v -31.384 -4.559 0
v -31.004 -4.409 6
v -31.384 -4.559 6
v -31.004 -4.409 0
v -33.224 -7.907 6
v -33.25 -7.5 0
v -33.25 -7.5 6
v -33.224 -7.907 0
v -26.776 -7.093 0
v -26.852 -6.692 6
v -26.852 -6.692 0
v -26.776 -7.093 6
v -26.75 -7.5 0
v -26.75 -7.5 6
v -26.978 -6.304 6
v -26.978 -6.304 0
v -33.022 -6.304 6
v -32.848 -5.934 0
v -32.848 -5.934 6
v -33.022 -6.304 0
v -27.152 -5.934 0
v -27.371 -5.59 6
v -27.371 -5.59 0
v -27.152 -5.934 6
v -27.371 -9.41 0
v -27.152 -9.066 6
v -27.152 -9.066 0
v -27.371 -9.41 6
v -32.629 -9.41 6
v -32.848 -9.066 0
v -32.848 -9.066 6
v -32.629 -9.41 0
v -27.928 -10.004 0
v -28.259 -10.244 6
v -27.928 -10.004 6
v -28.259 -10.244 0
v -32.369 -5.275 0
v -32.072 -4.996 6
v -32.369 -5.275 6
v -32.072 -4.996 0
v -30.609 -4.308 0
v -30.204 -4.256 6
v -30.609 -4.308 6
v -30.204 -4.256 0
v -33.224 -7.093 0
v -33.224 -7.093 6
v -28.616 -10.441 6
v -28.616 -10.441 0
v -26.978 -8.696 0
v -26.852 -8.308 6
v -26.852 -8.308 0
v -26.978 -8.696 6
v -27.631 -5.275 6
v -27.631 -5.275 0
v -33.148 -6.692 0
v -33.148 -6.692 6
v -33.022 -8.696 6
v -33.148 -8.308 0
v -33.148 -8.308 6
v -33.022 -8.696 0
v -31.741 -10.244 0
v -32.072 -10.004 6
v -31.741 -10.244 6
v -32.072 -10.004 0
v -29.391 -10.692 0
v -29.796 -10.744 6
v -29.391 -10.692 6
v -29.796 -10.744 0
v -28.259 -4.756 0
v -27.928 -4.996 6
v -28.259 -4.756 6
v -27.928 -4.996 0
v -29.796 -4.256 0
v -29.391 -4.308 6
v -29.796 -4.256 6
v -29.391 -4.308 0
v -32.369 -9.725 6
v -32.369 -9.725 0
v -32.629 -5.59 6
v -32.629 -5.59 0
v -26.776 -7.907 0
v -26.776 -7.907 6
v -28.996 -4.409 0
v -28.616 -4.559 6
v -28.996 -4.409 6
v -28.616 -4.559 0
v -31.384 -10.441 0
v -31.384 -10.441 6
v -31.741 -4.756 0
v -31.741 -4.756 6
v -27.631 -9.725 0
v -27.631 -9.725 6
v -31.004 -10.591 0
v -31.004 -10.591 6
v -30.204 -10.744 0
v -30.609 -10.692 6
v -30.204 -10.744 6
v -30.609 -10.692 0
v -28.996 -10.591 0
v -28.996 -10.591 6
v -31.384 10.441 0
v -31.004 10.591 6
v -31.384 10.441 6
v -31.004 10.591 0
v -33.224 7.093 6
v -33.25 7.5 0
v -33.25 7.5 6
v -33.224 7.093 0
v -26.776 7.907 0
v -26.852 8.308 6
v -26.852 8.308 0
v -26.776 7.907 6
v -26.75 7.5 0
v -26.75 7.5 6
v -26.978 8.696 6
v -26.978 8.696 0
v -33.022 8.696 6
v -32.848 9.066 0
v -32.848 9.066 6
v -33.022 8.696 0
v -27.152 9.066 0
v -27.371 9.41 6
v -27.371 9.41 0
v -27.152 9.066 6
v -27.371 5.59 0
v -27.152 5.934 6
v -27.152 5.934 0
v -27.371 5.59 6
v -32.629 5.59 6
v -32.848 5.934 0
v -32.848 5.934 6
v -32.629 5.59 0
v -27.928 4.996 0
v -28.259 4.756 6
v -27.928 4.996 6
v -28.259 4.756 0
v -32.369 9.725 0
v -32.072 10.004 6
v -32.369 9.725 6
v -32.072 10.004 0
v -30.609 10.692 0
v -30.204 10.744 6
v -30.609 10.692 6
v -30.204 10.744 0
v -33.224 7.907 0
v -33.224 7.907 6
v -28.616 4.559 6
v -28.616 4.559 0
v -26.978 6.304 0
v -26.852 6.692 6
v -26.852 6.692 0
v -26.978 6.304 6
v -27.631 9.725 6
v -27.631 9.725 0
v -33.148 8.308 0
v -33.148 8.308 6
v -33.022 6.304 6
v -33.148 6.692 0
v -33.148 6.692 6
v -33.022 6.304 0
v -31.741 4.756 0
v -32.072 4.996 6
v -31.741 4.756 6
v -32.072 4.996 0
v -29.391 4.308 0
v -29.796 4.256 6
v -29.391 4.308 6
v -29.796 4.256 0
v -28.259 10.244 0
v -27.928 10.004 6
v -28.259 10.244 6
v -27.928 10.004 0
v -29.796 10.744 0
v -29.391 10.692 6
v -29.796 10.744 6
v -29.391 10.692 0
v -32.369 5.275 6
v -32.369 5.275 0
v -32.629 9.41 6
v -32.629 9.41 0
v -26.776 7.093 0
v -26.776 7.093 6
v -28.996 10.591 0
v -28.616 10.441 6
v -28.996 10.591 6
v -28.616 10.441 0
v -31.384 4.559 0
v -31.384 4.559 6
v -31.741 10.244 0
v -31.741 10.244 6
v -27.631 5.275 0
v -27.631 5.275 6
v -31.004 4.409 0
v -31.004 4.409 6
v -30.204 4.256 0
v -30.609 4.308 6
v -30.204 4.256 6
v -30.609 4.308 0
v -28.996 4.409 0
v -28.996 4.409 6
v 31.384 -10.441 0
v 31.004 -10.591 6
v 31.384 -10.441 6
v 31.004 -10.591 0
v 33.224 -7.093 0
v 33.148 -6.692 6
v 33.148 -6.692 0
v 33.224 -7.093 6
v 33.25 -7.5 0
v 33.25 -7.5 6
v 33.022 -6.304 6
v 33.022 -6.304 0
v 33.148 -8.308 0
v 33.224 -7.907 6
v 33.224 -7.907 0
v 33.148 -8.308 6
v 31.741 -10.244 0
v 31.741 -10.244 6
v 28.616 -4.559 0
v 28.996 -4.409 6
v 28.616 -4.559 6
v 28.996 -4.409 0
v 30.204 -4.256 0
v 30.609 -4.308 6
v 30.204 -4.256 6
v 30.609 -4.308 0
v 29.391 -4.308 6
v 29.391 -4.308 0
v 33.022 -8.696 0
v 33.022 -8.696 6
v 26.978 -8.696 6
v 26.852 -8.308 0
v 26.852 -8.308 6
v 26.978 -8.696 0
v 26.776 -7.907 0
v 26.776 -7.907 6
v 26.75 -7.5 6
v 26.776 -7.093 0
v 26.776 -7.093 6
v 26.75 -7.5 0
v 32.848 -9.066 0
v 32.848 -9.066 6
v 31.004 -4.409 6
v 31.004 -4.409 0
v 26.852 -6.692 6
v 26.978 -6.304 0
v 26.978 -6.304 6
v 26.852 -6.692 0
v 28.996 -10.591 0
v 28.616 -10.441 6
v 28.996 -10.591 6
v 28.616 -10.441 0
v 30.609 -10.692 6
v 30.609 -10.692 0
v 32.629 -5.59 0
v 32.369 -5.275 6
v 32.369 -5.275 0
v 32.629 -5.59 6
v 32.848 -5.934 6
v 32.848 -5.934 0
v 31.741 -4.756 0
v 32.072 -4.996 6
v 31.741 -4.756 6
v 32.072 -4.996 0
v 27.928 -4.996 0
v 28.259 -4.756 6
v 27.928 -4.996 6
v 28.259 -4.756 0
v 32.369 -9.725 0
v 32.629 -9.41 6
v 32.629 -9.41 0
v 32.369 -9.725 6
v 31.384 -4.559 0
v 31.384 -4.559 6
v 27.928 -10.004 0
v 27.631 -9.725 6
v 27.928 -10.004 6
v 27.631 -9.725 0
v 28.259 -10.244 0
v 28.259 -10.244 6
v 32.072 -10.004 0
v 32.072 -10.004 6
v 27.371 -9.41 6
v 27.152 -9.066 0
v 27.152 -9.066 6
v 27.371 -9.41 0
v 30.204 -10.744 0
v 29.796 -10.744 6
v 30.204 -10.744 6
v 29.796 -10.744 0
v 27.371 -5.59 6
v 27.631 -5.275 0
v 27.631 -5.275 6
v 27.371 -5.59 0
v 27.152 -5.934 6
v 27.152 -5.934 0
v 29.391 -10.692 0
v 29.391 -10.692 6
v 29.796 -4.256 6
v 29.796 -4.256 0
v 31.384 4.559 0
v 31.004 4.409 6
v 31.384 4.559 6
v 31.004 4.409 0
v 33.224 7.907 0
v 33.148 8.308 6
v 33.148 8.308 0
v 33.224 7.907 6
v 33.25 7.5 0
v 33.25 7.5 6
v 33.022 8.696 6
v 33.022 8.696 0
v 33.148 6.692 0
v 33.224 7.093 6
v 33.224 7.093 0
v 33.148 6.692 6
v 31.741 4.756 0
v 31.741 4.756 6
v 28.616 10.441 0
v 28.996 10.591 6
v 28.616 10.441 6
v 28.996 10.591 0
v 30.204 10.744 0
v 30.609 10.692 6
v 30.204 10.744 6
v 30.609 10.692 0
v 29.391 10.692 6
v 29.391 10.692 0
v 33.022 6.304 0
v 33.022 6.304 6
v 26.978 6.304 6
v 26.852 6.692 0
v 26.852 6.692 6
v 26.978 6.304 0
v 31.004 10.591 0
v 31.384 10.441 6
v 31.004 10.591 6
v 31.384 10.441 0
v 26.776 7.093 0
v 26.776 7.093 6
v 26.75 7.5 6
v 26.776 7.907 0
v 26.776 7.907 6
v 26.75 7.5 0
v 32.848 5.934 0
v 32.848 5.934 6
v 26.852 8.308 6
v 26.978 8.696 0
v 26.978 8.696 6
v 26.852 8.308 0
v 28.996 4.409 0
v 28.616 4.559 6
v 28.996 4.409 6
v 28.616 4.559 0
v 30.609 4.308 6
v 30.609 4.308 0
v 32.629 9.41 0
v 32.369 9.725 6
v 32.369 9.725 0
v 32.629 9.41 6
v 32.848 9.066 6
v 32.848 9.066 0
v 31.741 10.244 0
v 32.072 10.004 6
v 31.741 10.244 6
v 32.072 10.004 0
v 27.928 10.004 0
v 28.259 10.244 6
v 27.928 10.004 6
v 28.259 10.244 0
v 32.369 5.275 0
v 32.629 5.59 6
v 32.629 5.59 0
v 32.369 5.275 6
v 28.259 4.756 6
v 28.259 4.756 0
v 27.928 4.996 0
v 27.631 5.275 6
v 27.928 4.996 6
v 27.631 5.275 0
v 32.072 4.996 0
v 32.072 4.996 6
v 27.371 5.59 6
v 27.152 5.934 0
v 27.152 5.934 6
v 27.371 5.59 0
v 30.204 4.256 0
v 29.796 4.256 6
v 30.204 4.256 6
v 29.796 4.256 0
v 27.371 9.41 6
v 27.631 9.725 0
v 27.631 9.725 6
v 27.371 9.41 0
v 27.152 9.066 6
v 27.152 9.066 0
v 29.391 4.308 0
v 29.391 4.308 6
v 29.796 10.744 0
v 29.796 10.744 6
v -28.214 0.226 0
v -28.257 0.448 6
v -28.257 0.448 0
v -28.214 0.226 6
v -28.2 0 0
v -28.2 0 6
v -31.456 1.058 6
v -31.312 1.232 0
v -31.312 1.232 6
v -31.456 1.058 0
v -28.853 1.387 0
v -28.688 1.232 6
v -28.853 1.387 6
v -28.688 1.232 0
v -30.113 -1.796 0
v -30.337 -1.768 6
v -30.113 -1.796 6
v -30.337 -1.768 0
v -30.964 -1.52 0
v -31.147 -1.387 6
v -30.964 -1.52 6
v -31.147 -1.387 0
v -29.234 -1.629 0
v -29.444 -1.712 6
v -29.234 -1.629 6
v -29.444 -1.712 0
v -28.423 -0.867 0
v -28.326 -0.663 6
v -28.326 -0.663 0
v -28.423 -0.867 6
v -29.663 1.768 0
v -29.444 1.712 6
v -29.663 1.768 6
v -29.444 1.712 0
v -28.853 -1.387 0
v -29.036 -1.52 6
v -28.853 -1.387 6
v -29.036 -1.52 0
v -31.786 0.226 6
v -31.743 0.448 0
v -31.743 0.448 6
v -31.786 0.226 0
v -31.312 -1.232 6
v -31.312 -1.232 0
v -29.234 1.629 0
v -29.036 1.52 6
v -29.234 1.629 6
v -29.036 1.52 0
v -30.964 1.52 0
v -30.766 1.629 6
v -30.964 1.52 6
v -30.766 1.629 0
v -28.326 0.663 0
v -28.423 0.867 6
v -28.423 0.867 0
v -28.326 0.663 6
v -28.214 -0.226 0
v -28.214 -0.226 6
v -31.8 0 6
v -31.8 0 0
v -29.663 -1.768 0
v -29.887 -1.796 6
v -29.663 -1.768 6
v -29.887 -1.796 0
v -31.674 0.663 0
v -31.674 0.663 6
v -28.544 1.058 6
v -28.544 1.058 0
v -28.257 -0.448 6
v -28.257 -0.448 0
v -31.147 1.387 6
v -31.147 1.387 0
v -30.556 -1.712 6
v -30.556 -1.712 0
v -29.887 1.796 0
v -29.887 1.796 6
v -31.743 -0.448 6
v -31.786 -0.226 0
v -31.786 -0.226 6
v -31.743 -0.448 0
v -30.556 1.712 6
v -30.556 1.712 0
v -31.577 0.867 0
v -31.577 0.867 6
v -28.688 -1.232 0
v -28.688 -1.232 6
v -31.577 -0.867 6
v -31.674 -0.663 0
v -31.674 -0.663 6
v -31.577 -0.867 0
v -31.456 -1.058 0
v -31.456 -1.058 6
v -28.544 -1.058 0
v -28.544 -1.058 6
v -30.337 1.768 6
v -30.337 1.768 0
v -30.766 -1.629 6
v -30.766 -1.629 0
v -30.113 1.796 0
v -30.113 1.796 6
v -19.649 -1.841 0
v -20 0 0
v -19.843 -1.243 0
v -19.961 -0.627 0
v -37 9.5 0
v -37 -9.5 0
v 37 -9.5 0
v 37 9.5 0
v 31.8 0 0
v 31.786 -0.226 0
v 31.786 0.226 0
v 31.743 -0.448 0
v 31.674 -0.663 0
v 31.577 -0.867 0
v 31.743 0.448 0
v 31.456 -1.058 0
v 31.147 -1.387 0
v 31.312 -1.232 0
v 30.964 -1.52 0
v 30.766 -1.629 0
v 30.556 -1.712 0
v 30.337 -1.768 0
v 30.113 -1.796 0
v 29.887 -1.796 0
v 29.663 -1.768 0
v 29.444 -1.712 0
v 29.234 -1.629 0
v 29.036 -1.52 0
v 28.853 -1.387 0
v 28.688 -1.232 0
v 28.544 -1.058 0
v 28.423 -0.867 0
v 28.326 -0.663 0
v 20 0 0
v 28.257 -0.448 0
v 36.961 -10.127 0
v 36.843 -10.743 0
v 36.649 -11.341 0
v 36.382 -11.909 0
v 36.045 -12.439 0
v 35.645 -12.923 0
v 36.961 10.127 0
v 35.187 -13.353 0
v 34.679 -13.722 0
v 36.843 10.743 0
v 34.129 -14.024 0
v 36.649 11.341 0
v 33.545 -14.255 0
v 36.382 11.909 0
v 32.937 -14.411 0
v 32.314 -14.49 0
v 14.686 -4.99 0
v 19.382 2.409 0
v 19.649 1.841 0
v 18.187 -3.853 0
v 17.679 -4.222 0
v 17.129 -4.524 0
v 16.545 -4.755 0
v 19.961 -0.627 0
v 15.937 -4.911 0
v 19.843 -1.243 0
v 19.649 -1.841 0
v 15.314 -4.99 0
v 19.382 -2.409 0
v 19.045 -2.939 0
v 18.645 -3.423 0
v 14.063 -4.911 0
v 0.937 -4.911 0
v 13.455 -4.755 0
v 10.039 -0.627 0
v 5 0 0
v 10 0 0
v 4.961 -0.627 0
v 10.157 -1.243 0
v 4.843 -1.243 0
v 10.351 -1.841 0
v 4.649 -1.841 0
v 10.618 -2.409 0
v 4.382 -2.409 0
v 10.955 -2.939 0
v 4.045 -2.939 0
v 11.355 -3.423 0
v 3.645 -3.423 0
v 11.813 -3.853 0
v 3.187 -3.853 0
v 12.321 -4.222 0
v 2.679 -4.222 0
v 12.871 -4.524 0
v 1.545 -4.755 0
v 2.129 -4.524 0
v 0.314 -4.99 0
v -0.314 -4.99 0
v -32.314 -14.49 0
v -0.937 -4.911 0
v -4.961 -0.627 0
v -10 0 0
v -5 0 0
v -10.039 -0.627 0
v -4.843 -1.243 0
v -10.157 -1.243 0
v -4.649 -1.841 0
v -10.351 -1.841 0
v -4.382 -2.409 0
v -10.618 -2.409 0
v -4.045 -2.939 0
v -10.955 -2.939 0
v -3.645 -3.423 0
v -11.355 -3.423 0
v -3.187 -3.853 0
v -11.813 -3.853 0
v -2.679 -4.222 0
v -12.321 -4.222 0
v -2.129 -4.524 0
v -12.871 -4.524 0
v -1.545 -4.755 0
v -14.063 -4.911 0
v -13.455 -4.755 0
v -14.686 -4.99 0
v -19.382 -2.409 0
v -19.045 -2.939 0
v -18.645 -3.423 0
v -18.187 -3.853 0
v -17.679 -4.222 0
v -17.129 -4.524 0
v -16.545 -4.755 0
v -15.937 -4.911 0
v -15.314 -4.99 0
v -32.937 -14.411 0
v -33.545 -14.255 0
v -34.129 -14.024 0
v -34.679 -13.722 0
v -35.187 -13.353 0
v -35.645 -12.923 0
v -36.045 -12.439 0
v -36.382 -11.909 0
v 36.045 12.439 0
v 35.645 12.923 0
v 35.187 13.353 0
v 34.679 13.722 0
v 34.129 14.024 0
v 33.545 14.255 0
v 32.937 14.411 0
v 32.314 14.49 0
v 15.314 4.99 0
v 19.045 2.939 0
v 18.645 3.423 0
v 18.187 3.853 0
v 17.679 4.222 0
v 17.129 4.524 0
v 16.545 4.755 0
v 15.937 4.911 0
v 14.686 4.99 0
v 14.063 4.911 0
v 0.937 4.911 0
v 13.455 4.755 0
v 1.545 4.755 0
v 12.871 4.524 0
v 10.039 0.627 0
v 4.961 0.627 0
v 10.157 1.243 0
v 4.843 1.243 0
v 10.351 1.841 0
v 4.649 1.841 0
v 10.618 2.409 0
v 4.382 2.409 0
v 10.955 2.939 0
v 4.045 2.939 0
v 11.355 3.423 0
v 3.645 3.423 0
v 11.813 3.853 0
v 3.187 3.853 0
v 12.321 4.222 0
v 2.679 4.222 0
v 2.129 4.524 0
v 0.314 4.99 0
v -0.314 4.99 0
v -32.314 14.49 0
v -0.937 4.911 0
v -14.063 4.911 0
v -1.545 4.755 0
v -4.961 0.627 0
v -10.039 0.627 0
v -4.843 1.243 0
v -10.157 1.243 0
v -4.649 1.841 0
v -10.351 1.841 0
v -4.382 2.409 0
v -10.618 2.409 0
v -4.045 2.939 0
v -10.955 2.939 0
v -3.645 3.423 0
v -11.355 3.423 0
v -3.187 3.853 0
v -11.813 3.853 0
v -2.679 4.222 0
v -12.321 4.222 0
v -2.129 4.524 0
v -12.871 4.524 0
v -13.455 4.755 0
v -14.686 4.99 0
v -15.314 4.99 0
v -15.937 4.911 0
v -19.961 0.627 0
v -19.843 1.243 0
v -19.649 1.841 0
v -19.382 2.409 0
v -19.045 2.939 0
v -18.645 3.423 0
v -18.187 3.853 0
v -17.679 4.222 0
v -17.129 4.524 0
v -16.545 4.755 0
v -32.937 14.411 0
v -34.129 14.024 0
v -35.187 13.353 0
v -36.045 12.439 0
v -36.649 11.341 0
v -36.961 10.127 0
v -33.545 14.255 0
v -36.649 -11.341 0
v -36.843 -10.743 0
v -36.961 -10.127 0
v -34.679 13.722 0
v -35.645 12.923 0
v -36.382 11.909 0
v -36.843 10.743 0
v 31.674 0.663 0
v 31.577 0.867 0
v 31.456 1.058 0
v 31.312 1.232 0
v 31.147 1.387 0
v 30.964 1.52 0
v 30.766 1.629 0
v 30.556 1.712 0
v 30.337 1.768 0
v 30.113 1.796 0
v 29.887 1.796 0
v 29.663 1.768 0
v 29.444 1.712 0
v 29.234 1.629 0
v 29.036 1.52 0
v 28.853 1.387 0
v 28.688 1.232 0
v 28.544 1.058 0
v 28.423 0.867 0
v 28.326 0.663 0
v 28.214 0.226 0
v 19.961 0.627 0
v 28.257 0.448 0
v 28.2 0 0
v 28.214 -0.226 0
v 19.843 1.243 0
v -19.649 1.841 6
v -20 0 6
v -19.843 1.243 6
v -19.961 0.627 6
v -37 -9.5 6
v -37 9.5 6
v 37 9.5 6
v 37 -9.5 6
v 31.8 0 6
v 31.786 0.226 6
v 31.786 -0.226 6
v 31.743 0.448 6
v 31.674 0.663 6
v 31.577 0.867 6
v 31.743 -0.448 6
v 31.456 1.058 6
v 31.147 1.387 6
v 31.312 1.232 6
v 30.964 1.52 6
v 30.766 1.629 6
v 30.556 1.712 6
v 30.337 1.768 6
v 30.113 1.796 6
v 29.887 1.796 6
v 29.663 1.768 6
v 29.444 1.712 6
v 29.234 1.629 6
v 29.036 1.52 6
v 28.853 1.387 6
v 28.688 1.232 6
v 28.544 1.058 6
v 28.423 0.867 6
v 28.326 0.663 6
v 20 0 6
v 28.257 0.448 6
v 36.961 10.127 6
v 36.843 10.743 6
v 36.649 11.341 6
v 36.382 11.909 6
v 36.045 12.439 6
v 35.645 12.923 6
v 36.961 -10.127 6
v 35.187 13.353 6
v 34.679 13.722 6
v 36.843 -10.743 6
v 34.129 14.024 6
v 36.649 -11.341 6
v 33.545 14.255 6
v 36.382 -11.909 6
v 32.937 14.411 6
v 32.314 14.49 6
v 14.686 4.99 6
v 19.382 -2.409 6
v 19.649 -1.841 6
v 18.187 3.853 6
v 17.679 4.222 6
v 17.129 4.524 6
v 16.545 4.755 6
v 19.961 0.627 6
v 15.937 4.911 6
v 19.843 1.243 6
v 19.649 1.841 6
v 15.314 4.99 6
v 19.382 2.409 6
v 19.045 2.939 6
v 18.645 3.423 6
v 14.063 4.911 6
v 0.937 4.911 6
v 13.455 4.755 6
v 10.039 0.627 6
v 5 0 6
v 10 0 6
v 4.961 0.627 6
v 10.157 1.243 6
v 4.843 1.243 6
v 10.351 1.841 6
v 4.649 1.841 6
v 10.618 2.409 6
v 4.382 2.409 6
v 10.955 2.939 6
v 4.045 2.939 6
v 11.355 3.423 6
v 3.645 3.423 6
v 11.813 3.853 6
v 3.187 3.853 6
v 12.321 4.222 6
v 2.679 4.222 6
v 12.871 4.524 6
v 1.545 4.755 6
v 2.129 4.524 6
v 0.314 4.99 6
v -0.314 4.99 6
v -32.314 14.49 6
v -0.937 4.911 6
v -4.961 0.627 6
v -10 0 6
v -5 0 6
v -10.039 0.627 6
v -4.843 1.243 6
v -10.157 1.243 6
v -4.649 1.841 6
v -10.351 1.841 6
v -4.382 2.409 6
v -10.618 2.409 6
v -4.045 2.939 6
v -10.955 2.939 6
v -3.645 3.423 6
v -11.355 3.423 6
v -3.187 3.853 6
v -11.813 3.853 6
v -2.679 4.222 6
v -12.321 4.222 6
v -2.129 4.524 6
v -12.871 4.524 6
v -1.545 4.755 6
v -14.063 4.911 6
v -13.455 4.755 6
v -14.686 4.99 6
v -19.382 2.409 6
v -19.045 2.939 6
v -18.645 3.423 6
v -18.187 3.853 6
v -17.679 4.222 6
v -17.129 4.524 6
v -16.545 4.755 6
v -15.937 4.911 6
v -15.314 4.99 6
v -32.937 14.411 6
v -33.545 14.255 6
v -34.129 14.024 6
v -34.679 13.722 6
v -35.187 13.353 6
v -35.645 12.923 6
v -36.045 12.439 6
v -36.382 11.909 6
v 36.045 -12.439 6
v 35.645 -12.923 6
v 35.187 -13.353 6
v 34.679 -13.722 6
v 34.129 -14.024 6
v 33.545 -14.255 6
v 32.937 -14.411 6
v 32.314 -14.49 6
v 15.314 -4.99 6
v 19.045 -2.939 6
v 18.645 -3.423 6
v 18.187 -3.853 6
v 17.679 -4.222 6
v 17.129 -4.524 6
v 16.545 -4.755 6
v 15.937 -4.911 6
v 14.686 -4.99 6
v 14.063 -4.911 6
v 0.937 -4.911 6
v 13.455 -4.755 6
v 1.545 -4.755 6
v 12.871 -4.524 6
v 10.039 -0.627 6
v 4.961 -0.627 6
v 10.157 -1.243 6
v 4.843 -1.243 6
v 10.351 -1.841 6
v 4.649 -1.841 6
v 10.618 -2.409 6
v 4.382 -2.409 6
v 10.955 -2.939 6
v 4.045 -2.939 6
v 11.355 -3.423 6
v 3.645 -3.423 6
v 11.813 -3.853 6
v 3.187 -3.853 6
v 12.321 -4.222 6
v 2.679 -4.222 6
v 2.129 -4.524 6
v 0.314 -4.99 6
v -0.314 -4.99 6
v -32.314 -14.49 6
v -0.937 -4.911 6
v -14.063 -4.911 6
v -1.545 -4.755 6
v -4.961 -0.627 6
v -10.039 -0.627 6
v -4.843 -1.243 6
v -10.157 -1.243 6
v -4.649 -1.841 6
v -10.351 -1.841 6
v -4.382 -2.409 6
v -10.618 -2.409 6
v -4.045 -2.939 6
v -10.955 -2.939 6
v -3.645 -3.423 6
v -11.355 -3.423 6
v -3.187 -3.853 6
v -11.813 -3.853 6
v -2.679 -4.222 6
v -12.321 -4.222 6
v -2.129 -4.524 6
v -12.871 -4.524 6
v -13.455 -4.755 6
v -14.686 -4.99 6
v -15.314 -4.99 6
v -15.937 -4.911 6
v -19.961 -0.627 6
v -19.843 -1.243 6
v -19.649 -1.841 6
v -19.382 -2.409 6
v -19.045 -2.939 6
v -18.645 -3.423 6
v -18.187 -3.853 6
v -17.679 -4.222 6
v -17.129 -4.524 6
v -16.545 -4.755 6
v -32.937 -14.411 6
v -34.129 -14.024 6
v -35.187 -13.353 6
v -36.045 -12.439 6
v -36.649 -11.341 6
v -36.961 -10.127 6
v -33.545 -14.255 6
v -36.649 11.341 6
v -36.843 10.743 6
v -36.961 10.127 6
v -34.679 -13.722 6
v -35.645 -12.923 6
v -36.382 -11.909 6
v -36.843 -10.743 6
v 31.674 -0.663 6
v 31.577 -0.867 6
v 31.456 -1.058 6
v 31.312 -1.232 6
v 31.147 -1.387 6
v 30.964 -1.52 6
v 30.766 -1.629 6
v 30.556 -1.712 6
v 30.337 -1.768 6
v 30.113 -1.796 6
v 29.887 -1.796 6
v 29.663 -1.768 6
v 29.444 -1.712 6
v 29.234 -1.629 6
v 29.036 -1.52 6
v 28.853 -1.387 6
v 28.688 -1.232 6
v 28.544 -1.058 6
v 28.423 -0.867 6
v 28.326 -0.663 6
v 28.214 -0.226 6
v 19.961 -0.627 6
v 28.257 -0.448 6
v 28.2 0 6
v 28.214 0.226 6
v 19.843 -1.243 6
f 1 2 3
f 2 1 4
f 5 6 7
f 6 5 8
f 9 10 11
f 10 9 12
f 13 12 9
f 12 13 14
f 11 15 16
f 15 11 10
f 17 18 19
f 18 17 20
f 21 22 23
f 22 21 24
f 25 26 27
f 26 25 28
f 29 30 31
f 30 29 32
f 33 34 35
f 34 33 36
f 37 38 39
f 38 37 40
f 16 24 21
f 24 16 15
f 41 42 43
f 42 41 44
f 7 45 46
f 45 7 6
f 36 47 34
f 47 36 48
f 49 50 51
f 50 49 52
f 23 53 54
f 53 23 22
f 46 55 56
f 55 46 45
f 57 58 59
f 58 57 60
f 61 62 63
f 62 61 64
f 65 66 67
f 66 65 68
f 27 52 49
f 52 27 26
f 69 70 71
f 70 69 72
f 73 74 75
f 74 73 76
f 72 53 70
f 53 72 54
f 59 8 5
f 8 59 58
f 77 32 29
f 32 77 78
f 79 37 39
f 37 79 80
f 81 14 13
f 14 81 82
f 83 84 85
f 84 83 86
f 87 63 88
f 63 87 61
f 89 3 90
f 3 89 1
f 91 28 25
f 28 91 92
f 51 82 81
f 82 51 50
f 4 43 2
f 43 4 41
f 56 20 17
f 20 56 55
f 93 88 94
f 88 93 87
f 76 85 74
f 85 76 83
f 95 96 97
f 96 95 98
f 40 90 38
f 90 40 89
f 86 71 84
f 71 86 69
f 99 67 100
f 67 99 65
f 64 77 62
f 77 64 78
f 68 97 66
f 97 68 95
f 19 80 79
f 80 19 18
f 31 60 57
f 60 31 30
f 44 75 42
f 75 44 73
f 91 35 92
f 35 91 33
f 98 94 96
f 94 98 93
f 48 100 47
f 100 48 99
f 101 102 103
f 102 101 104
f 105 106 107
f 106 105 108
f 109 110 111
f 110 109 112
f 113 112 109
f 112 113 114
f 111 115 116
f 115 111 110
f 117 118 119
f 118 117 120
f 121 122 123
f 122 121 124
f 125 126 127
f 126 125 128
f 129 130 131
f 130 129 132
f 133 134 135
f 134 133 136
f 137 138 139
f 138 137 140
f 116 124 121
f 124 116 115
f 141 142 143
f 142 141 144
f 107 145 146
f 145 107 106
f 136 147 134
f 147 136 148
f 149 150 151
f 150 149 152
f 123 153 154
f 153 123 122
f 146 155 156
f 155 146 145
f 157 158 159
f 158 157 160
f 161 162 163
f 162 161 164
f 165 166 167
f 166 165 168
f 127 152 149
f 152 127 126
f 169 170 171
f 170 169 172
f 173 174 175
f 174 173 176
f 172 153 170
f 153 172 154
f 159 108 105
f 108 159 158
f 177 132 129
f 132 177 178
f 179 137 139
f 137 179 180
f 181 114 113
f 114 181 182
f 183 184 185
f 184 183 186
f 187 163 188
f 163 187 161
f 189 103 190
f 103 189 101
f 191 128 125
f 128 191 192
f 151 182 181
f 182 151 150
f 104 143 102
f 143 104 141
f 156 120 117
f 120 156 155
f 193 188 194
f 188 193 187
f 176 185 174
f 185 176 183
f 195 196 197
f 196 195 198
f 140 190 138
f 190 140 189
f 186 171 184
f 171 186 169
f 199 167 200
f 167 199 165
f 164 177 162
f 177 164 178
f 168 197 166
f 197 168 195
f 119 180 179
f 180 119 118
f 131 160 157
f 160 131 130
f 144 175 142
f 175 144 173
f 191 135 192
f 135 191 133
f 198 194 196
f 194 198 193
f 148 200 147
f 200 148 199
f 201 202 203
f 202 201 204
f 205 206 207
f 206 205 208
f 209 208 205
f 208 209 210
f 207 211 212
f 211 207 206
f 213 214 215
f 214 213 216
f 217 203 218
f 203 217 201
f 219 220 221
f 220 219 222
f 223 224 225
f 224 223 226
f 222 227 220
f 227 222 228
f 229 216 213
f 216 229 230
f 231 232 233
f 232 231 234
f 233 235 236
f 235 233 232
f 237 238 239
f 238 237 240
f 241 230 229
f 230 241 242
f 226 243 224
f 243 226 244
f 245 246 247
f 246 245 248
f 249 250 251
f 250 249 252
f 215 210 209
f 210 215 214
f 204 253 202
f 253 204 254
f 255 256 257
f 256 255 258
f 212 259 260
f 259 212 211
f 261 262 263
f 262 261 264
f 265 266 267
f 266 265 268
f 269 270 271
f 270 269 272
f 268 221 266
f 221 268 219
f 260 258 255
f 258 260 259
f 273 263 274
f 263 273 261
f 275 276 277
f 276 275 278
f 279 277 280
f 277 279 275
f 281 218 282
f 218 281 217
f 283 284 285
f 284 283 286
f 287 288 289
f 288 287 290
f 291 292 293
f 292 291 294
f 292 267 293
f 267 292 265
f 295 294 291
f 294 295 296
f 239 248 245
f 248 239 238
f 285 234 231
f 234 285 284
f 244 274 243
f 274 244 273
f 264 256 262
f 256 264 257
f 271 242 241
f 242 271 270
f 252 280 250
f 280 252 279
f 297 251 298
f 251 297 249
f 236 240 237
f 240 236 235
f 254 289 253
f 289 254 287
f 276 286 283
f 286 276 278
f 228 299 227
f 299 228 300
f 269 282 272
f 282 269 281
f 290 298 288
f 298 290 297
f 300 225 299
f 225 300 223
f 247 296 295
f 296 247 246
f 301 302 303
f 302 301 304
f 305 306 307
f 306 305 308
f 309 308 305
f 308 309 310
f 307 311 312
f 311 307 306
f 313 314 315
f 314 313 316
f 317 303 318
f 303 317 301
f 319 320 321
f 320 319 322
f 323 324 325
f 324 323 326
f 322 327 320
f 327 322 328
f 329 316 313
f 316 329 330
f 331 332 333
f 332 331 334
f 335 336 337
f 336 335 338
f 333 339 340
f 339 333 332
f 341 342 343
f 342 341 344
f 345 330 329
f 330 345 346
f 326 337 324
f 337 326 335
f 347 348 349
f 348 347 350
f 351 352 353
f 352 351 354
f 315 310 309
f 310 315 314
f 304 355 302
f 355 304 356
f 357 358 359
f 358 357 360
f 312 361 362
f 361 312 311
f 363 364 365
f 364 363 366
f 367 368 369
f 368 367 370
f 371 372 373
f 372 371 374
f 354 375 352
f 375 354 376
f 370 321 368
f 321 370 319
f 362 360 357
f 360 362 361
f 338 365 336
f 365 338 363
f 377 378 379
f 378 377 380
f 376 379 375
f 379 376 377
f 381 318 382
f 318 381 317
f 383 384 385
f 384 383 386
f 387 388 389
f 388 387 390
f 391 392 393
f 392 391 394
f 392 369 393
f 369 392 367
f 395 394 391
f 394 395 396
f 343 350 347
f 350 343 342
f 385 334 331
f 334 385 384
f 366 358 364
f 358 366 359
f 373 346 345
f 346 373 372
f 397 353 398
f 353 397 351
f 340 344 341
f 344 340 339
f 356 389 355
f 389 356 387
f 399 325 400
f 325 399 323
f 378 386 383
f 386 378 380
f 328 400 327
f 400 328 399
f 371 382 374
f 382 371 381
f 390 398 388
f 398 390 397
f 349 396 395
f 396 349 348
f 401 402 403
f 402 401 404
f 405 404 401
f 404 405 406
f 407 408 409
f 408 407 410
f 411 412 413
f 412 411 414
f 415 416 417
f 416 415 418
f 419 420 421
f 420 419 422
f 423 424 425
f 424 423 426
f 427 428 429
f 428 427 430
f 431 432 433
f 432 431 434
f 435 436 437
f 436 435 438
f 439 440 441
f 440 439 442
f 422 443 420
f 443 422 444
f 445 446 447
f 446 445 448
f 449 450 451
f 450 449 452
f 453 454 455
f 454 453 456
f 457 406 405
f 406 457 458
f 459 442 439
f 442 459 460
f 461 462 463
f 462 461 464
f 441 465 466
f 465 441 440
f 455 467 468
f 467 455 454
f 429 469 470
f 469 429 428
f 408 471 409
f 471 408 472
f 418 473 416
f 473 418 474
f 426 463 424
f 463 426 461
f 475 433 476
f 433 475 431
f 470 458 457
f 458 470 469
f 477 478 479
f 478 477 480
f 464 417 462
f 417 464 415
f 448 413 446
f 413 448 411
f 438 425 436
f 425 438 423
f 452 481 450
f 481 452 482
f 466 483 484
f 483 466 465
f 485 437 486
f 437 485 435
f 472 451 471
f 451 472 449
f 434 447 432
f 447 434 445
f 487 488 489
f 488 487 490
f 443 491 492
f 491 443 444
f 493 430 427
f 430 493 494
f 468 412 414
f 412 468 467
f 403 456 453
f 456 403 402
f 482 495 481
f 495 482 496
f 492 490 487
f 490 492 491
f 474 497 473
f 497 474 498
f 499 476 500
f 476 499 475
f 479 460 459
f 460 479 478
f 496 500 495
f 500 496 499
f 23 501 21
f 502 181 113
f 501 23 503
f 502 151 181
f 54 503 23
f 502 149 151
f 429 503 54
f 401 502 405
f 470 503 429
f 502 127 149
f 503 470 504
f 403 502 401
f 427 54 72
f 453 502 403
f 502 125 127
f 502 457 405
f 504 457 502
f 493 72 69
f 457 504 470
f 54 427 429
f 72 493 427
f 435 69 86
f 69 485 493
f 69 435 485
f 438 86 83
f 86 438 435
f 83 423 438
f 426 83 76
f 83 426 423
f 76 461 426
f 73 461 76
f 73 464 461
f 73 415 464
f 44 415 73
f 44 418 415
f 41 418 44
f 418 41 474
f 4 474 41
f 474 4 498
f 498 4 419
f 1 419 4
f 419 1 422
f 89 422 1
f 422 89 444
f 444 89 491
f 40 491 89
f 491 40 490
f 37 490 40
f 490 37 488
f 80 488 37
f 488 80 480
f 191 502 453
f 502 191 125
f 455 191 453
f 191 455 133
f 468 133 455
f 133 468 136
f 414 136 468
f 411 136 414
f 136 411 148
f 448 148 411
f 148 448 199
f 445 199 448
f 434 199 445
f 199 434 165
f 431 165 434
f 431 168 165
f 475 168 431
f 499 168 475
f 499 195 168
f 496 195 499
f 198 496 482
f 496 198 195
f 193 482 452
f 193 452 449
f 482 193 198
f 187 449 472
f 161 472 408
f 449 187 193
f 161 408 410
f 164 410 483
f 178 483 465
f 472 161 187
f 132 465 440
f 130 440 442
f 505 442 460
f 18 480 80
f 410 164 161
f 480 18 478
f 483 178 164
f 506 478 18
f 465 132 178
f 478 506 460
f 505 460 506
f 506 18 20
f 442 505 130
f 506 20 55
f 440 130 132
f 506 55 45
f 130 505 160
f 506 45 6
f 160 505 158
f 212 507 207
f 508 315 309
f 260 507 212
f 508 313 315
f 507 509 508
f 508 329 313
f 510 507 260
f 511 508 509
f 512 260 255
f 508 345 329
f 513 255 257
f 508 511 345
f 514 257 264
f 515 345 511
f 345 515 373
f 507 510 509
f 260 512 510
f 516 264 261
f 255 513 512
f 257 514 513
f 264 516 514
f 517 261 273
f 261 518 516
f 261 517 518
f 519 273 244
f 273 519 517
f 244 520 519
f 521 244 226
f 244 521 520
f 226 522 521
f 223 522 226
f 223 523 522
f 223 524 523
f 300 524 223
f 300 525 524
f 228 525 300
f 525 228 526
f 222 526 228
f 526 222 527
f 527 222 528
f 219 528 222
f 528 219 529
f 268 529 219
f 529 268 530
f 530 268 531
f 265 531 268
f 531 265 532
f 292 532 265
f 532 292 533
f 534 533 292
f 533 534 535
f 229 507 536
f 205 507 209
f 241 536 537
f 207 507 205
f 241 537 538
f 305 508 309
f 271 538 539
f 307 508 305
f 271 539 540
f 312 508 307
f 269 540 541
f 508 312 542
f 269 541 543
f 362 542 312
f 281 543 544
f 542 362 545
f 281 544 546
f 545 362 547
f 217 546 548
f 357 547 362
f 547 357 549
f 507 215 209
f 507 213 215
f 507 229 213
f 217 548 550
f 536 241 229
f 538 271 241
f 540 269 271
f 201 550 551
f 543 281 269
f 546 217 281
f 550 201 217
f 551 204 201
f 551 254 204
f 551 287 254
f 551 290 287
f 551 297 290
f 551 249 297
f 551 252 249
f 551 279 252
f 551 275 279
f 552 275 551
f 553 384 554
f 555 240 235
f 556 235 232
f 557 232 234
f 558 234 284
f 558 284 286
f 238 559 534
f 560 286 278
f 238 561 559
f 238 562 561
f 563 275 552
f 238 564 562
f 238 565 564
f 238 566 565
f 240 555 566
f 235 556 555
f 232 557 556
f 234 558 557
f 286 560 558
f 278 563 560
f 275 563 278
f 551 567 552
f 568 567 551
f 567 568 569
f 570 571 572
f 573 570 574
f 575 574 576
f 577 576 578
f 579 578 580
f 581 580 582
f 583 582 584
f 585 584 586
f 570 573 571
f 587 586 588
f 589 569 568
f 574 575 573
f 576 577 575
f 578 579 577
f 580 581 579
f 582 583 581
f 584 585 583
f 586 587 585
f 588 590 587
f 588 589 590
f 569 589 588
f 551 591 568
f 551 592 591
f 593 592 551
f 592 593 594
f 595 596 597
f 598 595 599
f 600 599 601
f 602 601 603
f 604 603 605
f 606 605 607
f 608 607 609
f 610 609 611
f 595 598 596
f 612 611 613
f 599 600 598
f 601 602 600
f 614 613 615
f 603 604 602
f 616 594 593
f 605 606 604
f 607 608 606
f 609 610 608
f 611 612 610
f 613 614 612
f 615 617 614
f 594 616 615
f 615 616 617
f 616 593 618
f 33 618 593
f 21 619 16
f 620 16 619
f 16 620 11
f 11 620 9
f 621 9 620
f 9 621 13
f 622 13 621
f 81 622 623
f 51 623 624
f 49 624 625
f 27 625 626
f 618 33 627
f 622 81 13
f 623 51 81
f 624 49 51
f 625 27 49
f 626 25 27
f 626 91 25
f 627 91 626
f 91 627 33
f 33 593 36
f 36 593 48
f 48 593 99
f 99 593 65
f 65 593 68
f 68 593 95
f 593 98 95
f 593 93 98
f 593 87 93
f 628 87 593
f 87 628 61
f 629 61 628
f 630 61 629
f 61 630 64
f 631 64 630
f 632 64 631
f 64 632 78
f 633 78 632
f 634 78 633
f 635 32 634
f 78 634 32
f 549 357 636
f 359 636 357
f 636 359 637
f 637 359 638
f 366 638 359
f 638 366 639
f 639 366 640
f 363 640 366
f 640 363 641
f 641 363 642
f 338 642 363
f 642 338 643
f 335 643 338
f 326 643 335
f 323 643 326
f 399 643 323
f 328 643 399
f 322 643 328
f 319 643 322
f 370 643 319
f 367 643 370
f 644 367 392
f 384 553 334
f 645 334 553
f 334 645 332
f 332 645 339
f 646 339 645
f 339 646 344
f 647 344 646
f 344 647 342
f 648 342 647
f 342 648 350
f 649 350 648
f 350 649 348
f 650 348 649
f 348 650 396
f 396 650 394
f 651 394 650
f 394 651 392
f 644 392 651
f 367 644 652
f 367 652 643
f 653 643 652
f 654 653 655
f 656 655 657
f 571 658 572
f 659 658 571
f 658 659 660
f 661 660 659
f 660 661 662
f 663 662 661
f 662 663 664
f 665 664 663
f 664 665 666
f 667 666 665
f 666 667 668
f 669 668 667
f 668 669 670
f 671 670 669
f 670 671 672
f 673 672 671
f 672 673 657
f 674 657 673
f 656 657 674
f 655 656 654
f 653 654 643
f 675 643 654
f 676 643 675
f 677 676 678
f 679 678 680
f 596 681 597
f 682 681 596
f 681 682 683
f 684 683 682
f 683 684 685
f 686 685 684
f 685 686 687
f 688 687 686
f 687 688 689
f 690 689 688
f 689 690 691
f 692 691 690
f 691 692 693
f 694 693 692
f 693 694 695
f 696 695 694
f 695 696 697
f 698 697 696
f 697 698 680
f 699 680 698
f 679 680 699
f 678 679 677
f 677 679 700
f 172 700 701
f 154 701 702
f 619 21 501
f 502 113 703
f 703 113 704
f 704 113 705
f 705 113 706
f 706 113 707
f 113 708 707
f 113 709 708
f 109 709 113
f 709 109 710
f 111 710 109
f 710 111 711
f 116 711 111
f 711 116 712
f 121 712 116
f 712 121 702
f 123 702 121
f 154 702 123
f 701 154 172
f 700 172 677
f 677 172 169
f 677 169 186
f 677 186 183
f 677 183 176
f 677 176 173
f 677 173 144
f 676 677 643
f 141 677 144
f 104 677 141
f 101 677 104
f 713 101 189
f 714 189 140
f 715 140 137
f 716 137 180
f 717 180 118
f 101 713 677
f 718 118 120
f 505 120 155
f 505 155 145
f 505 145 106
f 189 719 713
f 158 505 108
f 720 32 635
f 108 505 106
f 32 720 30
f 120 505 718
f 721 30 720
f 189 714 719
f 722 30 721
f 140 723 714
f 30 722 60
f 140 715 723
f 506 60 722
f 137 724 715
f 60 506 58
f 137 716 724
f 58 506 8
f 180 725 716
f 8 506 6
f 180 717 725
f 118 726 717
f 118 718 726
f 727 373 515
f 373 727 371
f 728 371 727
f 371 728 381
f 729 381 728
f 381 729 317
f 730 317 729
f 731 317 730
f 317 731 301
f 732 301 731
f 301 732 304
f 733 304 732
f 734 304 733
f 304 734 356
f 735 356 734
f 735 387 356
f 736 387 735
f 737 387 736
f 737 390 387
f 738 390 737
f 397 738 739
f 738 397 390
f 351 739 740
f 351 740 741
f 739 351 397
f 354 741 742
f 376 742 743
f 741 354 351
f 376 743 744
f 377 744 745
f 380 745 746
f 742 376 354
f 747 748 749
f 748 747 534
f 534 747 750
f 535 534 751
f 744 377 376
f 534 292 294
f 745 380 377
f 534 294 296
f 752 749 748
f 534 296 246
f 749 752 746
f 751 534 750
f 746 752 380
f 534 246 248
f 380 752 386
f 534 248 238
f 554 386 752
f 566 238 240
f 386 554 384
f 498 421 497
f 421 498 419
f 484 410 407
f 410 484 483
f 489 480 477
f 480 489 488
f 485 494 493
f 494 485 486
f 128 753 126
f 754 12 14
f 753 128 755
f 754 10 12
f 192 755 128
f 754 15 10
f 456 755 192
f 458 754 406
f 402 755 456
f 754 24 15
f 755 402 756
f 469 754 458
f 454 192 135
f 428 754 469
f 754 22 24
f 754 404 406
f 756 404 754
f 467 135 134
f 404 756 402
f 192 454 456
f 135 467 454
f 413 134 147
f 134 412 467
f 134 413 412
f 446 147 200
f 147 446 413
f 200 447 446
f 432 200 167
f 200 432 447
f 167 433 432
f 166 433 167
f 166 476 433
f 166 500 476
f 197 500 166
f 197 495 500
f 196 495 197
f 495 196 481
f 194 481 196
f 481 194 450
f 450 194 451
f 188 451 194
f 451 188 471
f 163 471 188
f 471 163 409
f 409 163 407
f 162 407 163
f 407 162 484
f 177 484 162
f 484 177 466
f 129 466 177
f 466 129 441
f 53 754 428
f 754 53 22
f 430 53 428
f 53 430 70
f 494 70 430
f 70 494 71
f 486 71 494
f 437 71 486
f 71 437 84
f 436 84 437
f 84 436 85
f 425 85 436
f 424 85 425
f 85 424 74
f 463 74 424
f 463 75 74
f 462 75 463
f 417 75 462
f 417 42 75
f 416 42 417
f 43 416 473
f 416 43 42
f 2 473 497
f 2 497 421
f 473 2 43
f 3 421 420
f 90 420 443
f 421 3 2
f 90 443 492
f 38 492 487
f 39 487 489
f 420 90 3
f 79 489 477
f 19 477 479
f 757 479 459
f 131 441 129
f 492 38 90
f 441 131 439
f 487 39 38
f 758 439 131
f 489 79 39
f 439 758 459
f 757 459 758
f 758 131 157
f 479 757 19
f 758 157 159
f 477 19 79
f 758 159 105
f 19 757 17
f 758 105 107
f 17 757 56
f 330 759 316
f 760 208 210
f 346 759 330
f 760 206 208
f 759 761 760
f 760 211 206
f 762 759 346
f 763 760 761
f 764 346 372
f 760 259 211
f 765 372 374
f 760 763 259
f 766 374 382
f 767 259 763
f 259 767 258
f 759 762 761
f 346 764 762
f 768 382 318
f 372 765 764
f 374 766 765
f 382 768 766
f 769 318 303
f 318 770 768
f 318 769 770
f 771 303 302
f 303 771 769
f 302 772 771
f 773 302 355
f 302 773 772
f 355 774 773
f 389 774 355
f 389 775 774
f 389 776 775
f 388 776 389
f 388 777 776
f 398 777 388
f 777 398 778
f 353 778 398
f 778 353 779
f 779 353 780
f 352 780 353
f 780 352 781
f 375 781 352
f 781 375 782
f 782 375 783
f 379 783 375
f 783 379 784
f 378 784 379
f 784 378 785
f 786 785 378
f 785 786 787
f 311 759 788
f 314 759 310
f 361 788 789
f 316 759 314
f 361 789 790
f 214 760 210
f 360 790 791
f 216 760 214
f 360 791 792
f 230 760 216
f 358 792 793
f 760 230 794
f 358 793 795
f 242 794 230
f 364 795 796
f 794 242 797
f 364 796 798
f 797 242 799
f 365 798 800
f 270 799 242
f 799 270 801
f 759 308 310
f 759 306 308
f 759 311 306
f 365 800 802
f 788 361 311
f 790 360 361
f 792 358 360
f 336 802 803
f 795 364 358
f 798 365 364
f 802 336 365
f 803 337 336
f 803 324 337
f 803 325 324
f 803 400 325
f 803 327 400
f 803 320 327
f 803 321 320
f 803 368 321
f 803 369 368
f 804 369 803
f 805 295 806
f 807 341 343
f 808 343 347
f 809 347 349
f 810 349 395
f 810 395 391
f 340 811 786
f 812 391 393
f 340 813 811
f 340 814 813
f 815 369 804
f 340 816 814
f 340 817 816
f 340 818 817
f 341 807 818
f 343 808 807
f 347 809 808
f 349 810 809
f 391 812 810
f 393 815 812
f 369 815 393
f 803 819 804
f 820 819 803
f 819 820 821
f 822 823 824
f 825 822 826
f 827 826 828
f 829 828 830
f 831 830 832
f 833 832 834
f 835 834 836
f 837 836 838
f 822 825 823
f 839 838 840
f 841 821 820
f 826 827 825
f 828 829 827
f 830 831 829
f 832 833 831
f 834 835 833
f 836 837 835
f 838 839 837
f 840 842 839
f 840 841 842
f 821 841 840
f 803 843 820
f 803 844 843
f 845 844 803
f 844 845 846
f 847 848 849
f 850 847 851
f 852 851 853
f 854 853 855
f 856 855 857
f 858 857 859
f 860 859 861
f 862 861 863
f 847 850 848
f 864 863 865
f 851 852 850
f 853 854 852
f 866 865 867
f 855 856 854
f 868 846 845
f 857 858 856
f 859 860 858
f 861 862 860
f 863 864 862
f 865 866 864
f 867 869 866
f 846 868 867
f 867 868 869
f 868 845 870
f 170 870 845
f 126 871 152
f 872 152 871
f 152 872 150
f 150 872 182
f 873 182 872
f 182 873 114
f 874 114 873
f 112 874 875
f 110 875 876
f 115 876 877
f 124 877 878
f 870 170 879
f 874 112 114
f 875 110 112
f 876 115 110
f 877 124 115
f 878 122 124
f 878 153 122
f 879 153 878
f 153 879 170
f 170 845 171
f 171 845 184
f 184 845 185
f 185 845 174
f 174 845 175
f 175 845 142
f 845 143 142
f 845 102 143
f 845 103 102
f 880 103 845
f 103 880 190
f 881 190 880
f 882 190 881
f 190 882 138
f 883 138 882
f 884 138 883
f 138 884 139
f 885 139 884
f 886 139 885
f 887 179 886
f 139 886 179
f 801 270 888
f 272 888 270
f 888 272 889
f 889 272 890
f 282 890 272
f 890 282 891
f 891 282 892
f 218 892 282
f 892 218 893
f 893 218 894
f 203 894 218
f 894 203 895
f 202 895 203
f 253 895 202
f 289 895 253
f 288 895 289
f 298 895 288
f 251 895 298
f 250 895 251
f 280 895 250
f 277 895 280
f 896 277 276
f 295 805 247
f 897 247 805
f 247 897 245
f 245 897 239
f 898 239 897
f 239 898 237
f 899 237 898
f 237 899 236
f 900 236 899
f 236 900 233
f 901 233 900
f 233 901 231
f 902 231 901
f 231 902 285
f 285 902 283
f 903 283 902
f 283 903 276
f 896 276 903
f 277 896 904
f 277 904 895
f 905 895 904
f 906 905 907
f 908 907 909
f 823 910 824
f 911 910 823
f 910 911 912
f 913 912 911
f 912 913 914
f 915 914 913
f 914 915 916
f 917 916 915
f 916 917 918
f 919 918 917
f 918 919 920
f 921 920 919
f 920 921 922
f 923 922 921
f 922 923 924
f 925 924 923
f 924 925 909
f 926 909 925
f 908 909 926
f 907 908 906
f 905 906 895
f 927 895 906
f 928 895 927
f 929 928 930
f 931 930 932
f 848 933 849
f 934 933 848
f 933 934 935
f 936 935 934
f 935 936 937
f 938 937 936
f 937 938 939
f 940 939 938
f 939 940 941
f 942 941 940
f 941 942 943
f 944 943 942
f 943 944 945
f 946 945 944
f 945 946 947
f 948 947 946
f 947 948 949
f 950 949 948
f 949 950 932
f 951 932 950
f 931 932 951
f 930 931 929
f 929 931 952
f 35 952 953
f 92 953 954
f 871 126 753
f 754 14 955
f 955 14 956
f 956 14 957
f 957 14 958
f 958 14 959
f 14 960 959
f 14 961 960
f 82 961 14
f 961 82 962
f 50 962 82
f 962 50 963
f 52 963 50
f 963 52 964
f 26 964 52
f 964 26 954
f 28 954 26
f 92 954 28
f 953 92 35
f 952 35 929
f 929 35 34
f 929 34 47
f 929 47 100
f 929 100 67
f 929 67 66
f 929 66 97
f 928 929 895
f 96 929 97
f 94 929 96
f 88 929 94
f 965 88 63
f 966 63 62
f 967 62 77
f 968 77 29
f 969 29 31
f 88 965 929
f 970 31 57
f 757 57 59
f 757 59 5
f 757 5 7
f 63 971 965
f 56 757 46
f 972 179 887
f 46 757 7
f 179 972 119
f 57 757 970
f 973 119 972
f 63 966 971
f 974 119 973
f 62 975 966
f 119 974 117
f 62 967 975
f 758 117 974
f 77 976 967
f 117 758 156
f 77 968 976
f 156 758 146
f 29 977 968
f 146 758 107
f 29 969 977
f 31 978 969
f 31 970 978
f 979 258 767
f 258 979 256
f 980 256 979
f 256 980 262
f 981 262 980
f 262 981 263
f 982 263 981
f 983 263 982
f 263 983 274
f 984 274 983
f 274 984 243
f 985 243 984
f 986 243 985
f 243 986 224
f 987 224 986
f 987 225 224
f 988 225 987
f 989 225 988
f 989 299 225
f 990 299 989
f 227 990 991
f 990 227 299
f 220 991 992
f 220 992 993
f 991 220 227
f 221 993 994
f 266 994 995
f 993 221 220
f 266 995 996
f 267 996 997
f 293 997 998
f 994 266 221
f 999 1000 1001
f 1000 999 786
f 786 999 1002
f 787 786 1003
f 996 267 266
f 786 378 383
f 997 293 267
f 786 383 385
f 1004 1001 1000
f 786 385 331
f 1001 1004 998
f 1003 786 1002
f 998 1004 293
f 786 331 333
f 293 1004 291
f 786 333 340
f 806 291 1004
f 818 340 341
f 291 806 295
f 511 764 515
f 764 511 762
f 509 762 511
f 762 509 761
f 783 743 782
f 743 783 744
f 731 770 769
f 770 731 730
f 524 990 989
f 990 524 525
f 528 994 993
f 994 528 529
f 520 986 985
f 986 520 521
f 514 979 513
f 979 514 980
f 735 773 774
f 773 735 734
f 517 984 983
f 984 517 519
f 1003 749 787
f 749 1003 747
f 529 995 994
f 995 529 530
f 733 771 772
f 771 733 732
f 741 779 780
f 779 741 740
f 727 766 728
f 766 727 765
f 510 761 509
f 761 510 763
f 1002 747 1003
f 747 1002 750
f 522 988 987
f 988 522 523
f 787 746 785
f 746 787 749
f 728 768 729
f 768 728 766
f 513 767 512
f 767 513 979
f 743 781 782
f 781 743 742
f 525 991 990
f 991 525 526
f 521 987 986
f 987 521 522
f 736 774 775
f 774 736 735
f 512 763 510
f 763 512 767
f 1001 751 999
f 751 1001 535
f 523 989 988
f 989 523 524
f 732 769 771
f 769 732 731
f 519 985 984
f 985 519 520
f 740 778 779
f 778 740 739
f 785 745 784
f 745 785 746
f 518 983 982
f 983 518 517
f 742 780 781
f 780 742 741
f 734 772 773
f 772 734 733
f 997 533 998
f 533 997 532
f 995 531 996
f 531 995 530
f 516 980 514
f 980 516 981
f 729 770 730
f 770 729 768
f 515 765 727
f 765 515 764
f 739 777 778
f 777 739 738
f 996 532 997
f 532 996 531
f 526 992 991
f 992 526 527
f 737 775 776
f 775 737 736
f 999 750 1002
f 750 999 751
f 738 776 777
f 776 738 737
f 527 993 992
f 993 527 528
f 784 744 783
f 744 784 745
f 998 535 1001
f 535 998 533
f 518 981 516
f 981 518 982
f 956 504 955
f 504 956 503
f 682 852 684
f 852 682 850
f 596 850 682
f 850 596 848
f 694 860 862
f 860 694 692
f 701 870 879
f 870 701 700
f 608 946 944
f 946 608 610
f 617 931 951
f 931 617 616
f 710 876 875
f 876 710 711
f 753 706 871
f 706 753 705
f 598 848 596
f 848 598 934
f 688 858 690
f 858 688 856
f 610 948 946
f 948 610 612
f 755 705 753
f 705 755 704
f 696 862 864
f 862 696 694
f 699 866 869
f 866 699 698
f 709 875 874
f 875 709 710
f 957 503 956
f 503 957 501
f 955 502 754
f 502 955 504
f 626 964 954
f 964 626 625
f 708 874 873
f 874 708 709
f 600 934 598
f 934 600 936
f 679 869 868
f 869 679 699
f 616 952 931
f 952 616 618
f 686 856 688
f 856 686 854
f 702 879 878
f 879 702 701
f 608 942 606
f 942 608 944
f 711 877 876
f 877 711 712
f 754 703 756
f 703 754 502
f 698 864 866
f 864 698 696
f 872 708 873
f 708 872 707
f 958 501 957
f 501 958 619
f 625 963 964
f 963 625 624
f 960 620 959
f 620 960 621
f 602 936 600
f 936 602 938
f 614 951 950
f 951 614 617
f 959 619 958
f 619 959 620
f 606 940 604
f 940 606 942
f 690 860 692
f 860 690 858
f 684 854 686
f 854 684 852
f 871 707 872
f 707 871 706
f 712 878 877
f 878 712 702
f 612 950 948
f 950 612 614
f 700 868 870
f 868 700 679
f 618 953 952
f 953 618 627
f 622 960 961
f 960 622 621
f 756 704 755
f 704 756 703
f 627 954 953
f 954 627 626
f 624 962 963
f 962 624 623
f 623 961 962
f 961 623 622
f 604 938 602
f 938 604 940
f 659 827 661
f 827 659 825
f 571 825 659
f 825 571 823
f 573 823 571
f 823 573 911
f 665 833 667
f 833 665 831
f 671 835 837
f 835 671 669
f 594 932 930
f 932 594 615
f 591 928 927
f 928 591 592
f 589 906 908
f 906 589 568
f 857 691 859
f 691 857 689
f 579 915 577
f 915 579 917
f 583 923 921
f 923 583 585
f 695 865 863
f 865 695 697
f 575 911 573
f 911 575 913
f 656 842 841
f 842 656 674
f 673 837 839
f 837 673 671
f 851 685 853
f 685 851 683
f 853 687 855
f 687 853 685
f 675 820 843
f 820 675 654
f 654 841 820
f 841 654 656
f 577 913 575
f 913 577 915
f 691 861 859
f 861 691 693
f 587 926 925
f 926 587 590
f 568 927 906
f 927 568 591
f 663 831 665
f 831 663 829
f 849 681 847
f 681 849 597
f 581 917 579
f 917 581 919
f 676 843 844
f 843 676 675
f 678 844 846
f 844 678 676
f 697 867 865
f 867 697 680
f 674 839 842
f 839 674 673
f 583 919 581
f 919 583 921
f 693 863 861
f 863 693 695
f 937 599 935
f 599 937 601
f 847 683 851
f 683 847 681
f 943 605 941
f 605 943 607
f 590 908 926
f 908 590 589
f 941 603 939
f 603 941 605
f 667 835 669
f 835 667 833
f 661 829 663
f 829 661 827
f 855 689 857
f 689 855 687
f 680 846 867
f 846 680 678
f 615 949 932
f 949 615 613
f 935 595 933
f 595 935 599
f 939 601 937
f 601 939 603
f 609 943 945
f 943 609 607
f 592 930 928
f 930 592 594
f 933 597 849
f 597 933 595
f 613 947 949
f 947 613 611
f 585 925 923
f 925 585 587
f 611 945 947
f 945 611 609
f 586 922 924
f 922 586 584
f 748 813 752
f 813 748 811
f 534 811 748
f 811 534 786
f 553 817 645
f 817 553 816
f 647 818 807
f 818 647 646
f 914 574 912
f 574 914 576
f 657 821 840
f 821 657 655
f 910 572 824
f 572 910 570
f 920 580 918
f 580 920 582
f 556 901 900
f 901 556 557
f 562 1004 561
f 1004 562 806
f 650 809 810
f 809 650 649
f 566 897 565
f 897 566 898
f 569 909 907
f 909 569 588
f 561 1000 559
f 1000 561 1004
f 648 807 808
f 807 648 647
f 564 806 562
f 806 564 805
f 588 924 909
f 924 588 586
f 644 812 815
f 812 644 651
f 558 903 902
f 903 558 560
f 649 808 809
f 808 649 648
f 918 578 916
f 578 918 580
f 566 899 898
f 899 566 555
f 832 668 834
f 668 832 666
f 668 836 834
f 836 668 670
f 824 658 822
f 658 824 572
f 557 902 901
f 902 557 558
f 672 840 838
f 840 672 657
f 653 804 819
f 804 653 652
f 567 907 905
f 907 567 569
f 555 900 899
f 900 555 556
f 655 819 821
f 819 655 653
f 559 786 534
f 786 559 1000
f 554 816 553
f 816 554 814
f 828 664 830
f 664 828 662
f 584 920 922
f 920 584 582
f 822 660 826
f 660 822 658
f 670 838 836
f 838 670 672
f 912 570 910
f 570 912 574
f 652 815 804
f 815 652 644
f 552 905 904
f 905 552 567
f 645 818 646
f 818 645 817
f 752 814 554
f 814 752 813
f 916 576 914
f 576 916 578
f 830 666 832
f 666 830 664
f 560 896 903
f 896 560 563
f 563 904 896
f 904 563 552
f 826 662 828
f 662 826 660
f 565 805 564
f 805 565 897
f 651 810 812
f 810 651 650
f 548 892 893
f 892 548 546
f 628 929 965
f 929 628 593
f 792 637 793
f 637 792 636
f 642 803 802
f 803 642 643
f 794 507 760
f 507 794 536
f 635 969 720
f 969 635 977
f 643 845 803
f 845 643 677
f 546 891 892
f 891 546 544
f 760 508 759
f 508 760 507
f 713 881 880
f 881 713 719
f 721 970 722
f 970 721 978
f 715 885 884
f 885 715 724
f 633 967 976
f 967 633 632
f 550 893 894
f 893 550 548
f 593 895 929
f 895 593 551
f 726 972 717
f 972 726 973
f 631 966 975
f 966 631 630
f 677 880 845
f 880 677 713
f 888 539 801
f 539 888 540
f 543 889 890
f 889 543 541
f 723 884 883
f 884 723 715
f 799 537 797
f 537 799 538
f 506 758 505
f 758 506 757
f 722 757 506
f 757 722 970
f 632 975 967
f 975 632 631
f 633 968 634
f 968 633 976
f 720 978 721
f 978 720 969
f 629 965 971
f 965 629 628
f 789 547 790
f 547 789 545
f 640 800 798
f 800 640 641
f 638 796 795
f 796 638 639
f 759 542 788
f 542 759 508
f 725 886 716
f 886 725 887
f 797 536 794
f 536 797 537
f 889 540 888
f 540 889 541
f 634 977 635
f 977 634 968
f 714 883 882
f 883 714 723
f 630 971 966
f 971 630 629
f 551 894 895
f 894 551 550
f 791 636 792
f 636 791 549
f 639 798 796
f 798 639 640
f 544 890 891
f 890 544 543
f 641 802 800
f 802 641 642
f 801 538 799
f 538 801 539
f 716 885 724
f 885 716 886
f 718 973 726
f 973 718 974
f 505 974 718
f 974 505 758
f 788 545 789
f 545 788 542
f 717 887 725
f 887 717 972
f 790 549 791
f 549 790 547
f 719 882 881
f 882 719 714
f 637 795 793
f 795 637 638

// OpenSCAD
$fn = 50;


difference() {
	union() {
		hull() {
			translate(v = [-32.0000000000, 9.5000000000, 0]) {
				cylinder(h = 6, r = 5);
			}
			translate(v = [32.0000000000, 9.5000000000, 0]) {
				cylinder(h = 6, r = 5);
			}
			translate(v = [-32.0000000000, -9.5000000000, 0]) {
				cylinder(h = 6, r = 5);
			}
			translate(v = [32.0000000000, -9.5000000000, 0]) {
				cylinder(h = 6, r = 5);
			}
		}
	}
	union() {
		#translate(v = [-30.0000000000, -7.5000000000, 0]) {
			cylinder(h = 6, r = 3.2500000000);
		}
		#translate(v = [-30.0000000000, 7.5000000000, 0]) {
			cylinder(h = 6, r = 3.2500000000);
		}
		#translate(v = [30.0000000000, -7.5000000000, 0]) {
			cylinder(h = 6, r = 3.2500000000);
		}
		#translate(v = [30.0000000000, 7.5000000000, 0]) {
			cylinder(h = 6, r = 3.2500000000);
		}
		#translate(v = [-30.0000000000, -7.5000000000, -100.0000000000]) {
			cylinder(h = 200, r = 3.2500000000);
		}
		#translate(v = [-30.0000000000, 7.5000000000, -100.0000000000]) {
			cylinder(h = 200, r = 3.2500000000);
		}
		#translate(v = [30.0000000000, -7.5000000000, -100.0000000000]) {
			cylinder(h = 200, r = 3.2500000000);
		}
		#translate(v = [30.0000000000, 7.5000000000, -100.0000000000]) {
			cylinder(h = 200, r = 3.2500000000);
		}
		#translate(v = [-30.0000000000, -7.5000000000, 0]) {
			cylinder(h = 6, r = 1.8000000000);
		}
		#translate(v = [-30.0000000000, 0.0000000000, 0]) {
			cylinder(h = 6, r = 1.8000000000);
		}
		#translate(v = [-30.0000000000, 7.5000000000, 0]) {
			cylinder(h = 6, r = 1.8000000000);
		}
		#translate(v = [30.0000000000, -7.5000000000, 0]) {
			cylinder(h = 6, r = 1.8000000000);
		}
		#translate(v = [30.0000000000, 0.0000000000, 0]) {
			cylinder(h = 6, r = 1.8000000000);
		}
		#translate(v = [30.0000000000, 7.5000000000, 0]) {
			cylinder(h = 6, r = 1.8000000000);
		}
		#translate(v = [-30.0000000000, -7.5000000000, 0]) {
			cylinder(h = 6, r = 1.8000000000);
		}
		#translate(v = [-30.0000000000, 0.0000000000, 0]) {
			cylinder(h = 6, r = 1.8000000000);
		}
		#translate(v = [-30.0000000000, 7.5000000000, 0]) {
			cylinder(h = 6, r = 1.8000000000);
		}
		#translate(v = [30.0000000000, -7.5000000000, 0]) {
			cylinder(h = 6, r = 1.8000000000);
		}
		#translate(v = [30.0000000000, 0.0000000000, 0]) {
			cylinder(h = 6, r = 1.8000000000);
		}
		#translate(v = [30.0000000000, 7.5000000000, 0]) {
			cylinder(h = 6, r = 1.8000000000);
		}
		#translate(v = [-30.0000000000, -7.5000000000, 0]) {
			cylinder(h = 6, r = 1.8000000000);
		}
		#translate(v = [-30.0000000000, 0.0000000000, 0]) {
			cylinder(h = 6, r = 1.8000000000);
		}
		#translate(v = [-30.0000000000, 7.5000000000, 0]) {
			cylinder(h = 6, r = 1.8000000000);
		}
		#translate(v = [30.0000000000, -7.5000000000, 0]) {
			cylinder(h = 6, r = 1.8000000000);
		}
		#translate(v = [30.0000000000, 0.0000000000, 0]) {
			cylinder(h = 6, r = 1.8000000000);
		}
		#translate(v = [30.0000000000, 7.5000000000, 0]) {
			cylinder(h = 6, r = 1.8000000000);
		}
		#translate(v = [-15.0000000000, 0, 0]) {
			cylinder(h = 6, r = 5.0000000000);
		}
		#cylinder(h = 6, r = 5.0000000000);
		#translate(v = [15.0000000000, 0, 0]) {
			cylinder(h = 6, r = 5.0000000000);
		}
	}
}
